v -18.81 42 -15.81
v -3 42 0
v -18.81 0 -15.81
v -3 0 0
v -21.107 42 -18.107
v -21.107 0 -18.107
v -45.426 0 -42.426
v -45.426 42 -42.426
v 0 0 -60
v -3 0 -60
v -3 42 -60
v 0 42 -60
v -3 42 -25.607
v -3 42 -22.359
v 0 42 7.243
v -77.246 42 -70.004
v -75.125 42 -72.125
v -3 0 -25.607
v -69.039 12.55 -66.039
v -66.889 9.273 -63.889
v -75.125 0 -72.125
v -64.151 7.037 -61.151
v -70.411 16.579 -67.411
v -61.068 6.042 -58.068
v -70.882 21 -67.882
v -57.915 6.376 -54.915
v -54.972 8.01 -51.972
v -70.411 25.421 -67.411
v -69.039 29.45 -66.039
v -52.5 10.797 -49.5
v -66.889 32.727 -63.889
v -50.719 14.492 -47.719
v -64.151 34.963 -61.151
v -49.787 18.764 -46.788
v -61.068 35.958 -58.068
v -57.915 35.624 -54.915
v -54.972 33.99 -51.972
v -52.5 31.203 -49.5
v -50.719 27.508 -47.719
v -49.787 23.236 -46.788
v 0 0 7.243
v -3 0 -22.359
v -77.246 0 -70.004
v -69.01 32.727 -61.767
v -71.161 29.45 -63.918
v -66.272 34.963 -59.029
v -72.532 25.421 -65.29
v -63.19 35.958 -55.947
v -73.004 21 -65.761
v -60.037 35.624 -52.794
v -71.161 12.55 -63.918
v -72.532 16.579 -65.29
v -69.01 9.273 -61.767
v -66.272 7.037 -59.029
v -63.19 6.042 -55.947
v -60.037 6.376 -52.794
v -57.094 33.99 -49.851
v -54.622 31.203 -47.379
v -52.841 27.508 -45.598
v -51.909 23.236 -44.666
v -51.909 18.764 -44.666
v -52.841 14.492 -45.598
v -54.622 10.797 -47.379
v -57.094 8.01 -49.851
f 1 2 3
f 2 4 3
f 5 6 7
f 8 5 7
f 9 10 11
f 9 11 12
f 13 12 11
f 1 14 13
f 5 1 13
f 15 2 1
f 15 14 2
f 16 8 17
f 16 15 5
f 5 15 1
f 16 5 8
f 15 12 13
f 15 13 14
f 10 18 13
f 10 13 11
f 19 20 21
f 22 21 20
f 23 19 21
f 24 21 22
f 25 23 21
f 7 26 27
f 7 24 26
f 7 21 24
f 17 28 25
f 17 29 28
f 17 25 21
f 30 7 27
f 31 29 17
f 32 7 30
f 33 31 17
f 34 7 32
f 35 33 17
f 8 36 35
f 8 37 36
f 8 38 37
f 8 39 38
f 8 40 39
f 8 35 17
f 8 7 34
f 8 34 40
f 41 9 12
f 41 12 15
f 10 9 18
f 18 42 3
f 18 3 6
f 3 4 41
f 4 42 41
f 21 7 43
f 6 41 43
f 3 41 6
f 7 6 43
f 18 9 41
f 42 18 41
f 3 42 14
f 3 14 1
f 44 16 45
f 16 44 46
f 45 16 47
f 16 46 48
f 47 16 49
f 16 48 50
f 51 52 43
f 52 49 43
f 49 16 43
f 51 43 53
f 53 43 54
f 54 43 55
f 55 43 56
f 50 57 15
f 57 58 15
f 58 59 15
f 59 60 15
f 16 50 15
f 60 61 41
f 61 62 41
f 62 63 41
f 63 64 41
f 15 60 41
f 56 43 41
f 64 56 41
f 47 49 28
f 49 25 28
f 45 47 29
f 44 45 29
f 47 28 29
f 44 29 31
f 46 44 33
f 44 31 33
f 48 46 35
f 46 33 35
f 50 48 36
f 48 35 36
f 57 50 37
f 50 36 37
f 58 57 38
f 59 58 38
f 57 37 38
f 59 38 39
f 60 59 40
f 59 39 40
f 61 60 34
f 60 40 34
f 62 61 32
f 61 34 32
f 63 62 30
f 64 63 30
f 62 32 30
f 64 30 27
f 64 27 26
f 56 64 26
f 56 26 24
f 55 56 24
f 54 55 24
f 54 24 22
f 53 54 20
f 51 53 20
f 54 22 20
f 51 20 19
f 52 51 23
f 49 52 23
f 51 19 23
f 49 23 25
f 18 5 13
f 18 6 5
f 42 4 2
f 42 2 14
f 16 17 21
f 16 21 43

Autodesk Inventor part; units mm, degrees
ref_plane "YZ Plane" through (0, 0, 0) normal (1, 0, 0) x (0, 1, 0)
ref_plane "XZ Plane" through (0, 0, 0) normal (0, 1, 0) x (-1, 0, 0)
ref_plane "XY Plane" through (0, 0, 0) normal (0, 0, 1) x (1, 0, 0)
sketch "草图1" plane through (0, 0, 0) normal (0, 1, 0) x (-1, 0, 0)
  line L0 (3, -60) -> (0, -60)
  line L1 (0, -60) -> (0, 0)
  line L2 (45.4264, -42.4264) -> (47.5477, -40.3051)
  line L3 (47.5477, -40.3051) -> (0, 7.2426)
  line L4 (0, 0) -> (0, 7.2426)
  line L5 (3, -22.3594) -> (18.8105, -15.8105)
  line L6 (21.1066, -18.1066) -> (3, -25.6066)
  line L7 (3, 0) -> (18.8105, -15.8105)
  line L8 (21.1066, -18.1066) -> (45.4264, -42.4264)
  line L9 (3, 0) -> (3, -22.3594)
  line L10 (3, -25.6066) -> (3, -60)
  dimension "d3" = 60
  dimension "d6" = 3
extrude "拉伸1" add sketch "草图1" along normal blind 42
sketch "草图2" plane through (-47.5477, 0, -40.3051) normal (-0.7071, 0, -0.7071) x (-0.7071, 0, 0.7071)
  line L0 (-3, 0) -> (0, 0) projected
  line L1 (0, 0) -> (0, 42) projected
  line L2 (-3, 42) -> (0, 42) projected
  line L3 (-3, 0) -> (-3, 42) projected
  point P0 (-5.1213, 0)
extrude "拉伸2" add sketch "草图2" along normal blind 42
sketch "草图3" plane through (-21.1066, 0, -18.1066) normal (0.7071, 0, -0.7071) x (-0.7071, 0, -0.7071)
  line L0 (0, 0) -> (76.3934, 0) projected
  line L1 (76.3934, 42) -> (76.3934, 0) projected
  line L2 (0, 42) -> (76.3934, 42) projected
  line L3 (0, 0) -> (0, 42) projected
  circle A0 centre (55.3934, 21) radius 15
  point P0 (-27.7279, 0)
  dimension "d11" = 30
  dimension "d12" = 21
  dimension "d13" = 21
extrude "拉伸3" cut sketch "草图3" against normal blind 42 contours A0
properties part number "45度角件" material "钢"
